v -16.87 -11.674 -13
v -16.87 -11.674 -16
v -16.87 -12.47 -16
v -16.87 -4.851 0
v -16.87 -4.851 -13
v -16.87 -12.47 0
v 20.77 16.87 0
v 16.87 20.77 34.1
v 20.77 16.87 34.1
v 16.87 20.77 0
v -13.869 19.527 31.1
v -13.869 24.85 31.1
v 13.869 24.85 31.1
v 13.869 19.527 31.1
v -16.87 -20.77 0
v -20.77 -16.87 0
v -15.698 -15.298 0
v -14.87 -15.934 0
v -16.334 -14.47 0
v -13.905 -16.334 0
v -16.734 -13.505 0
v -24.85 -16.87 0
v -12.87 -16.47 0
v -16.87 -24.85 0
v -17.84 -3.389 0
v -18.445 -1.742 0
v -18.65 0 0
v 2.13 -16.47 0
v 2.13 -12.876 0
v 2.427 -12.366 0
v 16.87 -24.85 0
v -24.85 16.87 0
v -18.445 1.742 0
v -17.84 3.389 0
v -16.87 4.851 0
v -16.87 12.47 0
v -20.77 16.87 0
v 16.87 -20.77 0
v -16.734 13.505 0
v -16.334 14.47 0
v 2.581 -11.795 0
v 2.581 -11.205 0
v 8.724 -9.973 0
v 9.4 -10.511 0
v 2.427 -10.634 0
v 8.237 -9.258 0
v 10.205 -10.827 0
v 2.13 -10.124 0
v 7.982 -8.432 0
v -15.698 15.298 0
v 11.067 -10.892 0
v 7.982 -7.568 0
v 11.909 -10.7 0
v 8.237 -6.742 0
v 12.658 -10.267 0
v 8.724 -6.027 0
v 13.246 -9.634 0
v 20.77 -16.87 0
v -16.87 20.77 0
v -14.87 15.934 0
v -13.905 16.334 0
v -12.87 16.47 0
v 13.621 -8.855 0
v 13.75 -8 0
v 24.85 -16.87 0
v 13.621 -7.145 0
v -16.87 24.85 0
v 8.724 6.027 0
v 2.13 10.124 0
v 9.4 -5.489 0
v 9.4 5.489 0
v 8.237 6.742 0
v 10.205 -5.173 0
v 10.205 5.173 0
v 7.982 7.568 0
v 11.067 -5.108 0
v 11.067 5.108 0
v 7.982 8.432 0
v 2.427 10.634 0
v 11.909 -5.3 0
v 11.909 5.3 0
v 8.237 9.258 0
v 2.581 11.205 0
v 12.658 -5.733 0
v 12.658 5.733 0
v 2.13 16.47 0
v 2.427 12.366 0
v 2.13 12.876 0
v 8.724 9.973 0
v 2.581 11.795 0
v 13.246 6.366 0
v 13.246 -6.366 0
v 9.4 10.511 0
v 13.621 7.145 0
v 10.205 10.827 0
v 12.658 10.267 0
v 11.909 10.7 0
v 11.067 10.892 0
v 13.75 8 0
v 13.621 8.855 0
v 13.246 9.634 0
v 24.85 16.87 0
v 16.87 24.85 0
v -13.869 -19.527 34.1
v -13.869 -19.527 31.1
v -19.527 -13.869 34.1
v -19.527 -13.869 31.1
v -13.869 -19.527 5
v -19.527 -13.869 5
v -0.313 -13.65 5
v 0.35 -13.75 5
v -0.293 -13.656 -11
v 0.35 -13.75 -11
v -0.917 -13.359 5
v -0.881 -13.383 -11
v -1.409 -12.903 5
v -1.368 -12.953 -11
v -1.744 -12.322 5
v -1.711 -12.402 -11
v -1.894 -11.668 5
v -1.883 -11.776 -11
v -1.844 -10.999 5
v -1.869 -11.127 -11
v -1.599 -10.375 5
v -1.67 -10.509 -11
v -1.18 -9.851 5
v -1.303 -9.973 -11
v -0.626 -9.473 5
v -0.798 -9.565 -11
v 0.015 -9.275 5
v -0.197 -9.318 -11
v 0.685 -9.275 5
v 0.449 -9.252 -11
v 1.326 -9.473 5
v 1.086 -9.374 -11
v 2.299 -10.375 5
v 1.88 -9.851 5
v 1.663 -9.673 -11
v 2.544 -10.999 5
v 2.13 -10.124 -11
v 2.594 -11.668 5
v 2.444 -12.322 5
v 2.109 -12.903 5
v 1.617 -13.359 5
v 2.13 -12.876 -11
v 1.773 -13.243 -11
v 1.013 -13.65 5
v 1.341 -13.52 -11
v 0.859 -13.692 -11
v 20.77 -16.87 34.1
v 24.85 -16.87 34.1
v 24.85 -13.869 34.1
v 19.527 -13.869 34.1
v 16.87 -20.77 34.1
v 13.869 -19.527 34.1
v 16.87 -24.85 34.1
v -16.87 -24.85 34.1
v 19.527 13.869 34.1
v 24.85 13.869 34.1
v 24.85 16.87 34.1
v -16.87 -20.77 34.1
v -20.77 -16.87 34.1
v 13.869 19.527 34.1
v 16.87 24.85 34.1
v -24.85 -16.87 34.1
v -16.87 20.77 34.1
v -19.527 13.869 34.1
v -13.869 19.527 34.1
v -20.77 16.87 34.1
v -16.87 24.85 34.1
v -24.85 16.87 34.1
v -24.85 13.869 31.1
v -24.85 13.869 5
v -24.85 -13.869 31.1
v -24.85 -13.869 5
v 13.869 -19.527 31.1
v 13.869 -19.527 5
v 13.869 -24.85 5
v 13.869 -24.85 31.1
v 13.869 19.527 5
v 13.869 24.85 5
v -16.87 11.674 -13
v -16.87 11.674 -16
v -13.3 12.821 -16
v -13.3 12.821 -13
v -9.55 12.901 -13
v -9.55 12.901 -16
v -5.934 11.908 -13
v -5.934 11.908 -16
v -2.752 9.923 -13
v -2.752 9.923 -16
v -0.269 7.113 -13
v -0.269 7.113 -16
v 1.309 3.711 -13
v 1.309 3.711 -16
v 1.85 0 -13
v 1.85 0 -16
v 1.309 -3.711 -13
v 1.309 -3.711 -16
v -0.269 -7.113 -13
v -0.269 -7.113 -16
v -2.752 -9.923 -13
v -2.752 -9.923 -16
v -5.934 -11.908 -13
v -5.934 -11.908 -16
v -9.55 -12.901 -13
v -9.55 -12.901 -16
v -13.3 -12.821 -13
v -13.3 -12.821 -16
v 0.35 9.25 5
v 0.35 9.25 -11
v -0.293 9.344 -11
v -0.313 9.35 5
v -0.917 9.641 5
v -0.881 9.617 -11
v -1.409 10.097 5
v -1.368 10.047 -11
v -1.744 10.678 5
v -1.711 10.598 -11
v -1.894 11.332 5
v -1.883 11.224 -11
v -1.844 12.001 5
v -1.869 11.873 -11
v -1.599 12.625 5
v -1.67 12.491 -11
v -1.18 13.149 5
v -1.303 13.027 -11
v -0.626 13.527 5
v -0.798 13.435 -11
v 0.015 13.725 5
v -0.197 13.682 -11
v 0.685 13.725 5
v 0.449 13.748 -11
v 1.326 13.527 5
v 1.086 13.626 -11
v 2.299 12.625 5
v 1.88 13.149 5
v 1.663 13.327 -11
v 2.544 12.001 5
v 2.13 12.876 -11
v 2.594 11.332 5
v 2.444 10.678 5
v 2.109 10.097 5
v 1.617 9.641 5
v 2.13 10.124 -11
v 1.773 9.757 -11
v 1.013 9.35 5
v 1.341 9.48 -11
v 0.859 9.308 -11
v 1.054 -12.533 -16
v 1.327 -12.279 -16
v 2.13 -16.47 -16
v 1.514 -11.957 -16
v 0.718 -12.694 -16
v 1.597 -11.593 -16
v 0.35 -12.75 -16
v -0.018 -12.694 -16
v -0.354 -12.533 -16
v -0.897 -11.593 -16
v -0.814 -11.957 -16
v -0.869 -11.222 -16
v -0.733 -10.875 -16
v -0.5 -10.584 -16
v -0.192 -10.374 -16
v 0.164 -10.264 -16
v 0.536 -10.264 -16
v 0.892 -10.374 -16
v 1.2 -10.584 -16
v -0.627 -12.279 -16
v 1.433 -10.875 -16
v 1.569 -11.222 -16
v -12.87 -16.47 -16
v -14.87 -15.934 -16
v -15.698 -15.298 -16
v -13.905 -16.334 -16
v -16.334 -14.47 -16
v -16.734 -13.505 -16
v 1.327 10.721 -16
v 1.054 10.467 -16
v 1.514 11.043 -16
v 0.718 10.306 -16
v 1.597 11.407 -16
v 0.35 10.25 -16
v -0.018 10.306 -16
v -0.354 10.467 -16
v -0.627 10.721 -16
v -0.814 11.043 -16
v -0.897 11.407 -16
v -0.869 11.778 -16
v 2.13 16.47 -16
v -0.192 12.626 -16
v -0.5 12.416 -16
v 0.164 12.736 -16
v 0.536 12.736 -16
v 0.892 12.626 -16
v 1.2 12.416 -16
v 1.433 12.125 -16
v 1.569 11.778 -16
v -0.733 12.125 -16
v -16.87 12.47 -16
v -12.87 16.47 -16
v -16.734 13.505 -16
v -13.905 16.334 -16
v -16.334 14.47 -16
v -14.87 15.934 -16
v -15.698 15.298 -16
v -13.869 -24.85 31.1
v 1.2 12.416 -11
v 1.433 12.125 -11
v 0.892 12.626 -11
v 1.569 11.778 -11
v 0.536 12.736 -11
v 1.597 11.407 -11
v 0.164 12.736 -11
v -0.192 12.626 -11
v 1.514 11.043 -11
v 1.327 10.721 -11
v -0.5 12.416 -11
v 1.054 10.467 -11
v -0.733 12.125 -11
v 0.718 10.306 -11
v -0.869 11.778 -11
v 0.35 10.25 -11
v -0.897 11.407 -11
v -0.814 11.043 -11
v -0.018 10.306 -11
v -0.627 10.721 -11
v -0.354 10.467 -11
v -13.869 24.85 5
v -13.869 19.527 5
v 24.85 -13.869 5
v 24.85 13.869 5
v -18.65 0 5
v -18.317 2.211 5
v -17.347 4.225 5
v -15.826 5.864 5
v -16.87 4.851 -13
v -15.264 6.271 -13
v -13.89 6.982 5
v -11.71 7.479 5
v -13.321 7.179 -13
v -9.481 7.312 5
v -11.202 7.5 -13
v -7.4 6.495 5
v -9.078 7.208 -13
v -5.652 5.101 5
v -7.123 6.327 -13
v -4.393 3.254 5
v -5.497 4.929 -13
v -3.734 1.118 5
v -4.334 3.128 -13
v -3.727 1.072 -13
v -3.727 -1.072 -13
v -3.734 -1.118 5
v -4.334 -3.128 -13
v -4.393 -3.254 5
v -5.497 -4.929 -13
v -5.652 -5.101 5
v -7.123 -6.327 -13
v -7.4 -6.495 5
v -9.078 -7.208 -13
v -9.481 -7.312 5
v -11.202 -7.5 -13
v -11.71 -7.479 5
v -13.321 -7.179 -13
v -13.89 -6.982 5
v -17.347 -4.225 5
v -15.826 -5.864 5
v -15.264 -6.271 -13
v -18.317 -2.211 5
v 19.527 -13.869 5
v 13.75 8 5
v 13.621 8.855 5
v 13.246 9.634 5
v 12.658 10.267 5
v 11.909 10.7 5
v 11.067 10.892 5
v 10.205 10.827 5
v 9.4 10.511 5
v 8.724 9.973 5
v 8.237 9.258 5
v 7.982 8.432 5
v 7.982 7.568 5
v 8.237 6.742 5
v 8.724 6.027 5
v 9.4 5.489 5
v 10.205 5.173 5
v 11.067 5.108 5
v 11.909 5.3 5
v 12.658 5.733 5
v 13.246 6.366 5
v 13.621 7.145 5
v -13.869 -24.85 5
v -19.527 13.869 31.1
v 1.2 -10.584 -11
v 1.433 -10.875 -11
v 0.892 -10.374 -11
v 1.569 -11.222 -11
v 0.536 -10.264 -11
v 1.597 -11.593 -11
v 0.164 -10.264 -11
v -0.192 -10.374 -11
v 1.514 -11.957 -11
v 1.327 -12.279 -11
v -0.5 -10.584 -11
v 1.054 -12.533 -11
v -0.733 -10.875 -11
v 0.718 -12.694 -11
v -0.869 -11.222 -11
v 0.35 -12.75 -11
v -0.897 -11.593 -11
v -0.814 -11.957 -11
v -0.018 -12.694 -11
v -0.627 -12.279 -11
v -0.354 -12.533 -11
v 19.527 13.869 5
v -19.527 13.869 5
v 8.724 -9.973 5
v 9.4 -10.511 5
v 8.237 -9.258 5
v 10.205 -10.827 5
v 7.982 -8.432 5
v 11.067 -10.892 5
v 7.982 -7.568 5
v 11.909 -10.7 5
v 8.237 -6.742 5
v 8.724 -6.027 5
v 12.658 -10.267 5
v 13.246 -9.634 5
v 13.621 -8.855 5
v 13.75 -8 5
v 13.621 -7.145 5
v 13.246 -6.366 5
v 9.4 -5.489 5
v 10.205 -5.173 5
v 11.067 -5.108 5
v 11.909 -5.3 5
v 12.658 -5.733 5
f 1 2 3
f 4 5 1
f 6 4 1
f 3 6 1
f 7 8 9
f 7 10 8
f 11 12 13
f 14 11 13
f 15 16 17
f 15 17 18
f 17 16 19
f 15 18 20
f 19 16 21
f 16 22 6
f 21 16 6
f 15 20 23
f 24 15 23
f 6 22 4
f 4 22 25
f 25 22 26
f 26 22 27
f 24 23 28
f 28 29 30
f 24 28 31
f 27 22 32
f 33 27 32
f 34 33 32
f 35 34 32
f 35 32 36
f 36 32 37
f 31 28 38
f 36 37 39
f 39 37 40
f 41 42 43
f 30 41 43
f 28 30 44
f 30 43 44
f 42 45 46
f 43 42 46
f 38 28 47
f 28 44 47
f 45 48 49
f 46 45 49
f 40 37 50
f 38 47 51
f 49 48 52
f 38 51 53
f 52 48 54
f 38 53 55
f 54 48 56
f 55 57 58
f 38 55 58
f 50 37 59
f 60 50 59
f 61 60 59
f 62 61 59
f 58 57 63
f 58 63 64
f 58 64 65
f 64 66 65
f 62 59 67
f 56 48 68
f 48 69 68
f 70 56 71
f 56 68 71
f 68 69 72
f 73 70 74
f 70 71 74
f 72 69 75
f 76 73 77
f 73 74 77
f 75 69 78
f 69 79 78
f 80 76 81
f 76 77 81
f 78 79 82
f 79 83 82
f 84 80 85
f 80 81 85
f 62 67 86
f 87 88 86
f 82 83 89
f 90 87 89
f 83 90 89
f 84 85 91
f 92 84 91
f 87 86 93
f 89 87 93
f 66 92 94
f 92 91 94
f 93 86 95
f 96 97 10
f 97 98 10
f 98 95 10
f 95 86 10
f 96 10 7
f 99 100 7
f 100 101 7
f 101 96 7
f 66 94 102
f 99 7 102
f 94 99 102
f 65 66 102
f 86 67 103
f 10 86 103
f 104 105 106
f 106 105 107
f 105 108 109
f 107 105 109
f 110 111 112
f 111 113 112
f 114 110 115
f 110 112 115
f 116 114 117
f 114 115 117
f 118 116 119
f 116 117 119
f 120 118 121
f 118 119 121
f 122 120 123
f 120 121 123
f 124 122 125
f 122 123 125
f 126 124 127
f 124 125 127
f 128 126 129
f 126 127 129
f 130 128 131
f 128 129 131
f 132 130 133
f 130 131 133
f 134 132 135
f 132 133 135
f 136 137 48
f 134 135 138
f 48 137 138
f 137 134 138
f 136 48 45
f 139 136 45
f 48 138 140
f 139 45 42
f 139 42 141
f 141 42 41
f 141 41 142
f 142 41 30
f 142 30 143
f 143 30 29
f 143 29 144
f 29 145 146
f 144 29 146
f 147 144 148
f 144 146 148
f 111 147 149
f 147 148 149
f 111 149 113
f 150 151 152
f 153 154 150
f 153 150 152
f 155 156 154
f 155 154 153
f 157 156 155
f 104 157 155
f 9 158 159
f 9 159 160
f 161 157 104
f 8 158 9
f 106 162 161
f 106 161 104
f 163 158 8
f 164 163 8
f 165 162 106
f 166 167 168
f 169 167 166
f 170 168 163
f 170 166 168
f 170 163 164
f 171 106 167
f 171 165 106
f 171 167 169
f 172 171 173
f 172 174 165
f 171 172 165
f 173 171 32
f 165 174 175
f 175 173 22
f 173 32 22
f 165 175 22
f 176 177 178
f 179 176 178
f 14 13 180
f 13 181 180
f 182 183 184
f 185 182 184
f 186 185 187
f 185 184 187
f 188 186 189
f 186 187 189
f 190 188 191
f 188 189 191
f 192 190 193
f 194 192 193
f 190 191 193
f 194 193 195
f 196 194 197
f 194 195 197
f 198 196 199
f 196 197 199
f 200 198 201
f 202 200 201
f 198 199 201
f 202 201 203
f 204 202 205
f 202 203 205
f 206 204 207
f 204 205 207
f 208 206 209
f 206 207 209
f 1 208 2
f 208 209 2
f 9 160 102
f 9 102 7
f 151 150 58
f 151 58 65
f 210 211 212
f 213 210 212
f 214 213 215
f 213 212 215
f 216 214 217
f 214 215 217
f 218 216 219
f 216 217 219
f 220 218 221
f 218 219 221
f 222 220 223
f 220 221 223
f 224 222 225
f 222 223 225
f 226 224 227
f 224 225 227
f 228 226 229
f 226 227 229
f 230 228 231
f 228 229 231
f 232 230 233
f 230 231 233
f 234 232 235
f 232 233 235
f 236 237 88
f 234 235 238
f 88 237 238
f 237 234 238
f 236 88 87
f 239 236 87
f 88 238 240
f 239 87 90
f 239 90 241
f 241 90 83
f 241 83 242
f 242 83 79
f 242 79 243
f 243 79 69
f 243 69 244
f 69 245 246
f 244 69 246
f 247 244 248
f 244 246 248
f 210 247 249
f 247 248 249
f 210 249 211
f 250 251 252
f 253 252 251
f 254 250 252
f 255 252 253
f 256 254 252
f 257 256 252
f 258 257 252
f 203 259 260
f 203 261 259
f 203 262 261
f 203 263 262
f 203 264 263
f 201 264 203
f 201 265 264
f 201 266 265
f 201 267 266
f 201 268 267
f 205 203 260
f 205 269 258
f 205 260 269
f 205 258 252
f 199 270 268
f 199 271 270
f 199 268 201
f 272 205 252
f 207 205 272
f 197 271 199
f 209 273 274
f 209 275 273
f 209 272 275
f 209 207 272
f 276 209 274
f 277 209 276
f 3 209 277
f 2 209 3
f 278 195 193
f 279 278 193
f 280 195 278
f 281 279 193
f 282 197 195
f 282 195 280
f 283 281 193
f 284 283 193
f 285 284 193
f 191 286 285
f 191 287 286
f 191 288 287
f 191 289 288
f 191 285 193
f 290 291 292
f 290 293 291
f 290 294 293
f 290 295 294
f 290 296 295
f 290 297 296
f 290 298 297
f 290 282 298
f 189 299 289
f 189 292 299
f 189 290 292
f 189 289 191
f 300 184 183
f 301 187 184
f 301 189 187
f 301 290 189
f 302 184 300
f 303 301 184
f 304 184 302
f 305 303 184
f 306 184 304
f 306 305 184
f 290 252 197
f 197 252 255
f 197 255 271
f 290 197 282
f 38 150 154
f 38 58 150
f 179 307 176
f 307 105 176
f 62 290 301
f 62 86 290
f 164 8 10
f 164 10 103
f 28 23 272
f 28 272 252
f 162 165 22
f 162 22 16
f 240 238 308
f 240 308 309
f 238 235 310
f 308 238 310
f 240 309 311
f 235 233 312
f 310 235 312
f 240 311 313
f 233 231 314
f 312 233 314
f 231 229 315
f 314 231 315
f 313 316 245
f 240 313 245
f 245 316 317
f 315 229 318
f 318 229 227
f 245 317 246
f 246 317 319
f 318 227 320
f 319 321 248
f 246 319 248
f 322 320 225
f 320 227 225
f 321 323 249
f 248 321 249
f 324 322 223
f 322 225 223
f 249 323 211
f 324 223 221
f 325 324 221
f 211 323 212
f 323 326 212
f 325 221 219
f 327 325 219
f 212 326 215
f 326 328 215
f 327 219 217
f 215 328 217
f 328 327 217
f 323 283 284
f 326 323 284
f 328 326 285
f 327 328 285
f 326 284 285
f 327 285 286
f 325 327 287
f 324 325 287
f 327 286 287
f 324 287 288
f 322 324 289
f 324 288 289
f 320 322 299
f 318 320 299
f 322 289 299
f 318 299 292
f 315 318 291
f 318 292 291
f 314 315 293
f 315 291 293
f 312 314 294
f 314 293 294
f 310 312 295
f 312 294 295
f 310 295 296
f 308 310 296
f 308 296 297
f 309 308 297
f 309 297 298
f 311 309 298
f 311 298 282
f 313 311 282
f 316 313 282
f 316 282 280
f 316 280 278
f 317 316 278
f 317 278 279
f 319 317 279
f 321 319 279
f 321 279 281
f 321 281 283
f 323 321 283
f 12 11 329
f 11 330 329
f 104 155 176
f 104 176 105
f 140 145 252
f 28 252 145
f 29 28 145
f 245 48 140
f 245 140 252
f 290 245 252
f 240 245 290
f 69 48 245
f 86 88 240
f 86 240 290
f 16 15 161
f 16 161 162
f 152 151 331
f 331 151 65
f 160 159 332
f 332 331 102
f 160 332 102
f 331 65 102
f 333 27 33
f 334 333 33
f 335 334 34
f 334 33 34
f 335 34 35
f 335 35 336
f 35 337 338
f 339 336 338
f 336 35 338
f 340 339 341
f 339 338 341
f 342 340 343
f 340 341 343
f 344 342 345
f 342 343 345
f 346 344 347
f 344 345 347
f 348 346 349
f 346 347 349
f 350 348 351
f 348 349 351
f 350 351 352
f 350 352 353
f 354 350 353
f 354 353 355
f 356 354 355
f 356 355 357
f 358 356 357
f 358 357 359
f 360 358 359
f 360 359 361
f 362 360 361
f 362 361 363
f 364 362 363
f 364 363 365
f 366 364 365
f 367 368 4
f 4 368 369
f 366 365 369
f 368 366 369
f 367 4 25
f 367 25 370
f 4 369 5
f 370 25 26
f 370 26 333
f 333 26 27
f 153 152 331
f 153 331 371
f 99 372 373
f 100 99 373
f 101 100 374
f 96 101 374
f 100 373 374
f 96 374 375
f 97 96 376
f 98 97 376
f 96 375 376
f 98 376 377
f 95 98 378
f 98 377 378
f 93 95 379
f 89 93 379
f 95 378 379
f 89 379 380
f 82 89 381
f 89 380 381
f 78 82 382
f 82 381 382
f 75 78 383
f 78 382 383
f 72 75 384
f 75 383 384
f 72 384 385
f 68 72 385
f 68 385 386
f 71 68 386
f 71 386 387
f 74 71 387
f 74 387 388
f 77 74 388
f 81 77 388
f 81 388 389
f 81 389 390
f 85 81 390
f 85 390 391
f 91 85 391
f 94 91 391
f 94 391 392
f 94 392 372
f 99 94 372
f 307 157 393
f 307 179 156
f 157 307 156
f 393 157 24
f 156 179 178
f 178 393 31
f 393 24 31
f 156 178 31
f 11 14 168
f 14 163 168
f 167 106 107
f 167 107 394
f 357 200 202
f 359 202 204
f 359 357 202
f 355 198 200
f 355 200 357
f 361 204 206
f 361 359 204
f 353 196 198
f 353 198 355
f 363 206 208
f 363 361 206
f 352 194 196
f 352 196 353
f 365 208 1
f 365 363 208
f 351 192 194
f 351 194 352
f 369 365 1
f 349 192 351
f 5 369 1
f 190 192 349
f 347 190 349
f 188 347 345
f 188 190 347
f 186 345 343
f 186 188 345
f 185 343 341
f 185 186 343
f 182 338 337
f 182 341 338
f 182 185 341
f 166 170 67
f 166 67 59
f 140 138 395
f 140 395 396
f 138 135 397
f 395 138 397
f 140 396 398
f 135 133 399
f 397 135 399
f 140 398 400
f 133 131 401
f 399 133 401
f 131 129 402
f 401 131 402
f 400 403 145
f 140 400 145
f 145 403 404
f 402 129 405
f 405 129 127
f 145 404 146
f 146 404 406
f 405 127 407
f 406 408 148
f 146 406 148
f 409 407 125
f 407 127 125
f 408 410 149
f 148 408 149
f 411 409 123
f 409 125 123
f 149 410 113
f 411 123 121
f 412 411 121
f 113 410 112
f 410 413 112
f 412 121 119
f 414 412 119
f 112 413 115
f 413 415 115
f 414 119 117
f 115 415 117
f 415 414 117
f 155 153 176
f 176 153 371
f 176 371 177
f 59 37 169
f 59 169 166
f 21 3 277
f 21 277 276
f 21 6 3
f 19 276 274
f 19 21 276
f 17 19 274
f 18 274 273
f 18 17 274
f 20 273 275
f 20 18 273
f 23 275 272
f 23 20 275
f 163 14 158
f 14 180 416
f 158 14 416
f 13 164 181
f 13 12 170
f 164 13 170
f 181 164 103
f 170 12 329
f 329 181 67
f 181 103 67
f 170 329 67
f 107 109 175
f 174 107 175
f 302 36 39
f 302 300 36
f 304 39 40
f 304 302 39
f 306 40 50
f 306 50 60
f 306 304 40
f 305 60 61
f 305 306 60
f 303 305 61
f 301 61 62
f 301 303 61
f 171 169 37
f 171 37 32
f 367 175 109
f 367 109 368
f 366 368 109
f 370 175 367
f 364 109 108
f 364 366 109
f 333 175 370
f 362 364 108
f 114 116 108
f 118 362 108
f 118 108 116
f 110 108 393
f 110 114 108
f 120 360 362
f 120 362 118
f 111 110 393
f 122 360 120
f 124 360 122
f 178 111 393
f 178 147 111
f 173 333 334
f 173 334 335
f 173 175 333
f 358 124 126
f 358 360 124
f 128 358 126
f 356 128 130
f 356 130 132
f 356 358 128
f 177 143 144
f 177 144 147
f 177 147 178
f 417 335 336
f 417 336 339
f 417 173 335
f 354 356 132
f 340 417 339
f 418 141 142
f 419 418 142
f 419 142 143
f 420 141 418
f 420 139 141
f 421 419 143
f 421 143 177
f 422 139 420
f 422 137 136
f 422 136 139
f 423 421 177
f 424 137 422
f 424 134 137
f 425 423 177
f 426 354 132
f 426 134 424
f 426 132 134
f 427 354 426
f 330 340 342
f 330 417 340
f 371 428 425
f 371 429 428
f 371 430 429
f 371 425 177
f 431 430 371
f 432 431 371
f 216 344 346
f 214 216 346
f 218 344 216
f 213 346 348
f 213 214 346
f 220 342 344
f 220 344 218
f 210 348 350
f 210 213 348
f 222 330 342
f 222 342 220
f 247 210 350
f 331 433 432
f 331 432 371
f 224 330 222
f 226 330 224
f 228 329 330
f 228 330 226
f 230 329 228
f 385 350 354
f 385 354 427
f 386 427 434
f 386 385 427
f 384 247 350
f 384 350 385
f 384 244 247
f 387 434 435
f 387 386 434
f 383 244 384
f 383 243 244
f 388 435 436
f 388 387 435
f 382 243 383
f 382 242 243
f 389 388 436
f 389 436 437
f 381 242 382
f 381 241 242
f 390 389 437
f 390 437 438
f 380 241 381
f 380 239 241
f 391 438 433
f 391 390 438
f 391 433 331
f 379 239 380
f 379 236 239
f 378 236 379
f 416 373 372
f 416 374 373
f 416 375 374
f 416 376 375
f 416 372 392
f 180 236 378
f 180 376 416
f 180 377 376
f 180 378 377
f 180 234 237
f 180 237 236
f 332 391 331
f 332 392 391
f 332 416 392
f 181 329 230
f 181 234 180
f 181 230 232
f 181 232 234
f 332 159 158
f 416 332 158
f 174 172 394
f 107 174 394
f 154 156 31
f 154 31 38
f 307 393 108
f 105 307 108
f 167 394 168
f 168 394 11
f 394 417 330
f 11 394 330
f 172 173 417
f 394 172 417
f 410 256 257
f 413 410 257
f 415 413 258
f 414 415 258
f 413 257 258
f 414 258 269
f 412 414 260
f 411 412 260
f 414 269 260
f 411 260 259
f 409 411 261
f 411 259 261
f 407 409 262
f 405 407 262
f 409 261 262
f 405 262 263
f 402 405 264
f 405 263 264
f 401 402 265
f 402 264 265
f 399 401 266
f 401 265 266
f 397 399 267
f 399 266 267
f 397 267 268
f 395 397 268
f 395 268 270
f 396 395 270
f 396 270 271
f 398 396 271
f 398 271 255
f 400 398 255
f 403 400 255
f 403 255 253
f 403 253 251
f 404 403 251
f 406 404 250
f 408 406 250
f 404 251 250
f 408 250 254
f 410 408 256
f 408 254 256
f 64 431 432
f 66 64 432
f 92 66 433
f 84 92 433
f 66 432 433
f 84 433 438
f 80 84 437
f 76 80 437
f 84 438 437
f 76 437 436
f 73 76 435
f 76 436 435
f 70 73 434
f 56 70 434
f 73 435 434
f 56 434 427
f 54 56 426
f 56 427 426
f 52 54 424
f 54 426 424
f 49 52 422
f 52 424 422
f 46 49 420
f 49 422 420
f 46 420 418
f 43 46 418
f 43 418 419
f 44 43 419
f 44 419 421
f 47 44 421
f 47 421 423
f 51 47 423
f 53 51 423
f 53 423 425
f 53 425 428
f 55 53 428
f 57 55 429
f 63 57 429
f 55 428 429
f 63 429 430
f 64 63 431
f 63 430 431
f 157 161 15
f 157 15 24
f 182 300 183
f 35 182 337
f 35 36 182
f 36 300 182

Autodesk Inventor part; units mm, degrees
ref_plane "Work Plane1" through (0, 0, 0) normal (0, 0, 1) x (1, 0, 0)
sketch "Sketch1" plane through (0, 0, 0) normal (0, 0, 1) x (1, 0, 0)
  arc A0 (12.5934, -5.8404) -> (12.8401, -5.9947) centre (12.8241, -5.7459) ccw construction
  line L0 (12.8401, -5.9947) -> (16.4715, -5.9947) construction
  line L1 (16.4715, -5.9947) -> (16.97, -5.4961) construction
  line L2 (16.97, -5.4961) -> (16.97, 1.583) construction
  arc A1 (16.97, 2.3806) -> (16.97, 1.583) centre (17.2691, 1.9818) ccw construction
  line L3 (16.97, 2.3806) -> (16.97, 5.4715) construction
  line L4 (16.97, 5.4715) -> (16.4715, 5.97) construction
  line L5 (16.4715, 5.97) -> (12.8401, 5.97) construction
  arc A2 (12.8401, 5.97) -> (12.6094, 5.8152) centre (12.8401, 5.7207) ccw construction
  arc A3 (12.0954, 5.2394) -> (12.6094, 5.8152) centre (11.5075, 6.2814) ccw construction
  arc A4 (12.0954, 5.2394) -> (11.974, 5.0466) centre (12.2223, 5.0248) ccw construction
  line L6 (11.974, 5.0466) -> (11.9439, 4.702) construction
  arc A5 (11.6955, 4.4744) -> (11.9439, 4.702) centre (11.6955, 4.7237) ccw construction
  line L7 (11.6955, 4.4744) -> (11.2445, 4.4744) construction
  arc A6 (10.9961, 4.702) -> (11.2445, 4.4744) centre (11.2445, 4.7237) ccw construction
  line L8 (10.9961, 4.702) -> (10.9642, 5.0674) construction
  arc A7 (10.9642, 5.0674) -> (10.8487, 5.2566) centre (10.7158, 5.0457) ccw construction
  arc A8 (10.3792, 5.8152) -> (10.8487, 5.2566) centre (11.4862, 6.2691) ccw construction
  arc A9 (10.3792, 5.8152) -> (10.1485, 5.97) centre (10.1485, 5.7206) ccw construction
  line L9 (10.1485, 5.97) -> (9.4685, 5.97) construction
  line L10 (9.4685, 5.97) -> (8.97, 5.4715) construction
  line L11 (8.97, 5.4715) -> (8.97, -5.4961) construction
  line L12 (8.97, -5.4961) -> (9.4685, -5.9947) construction
  line L13 (9.4685, -5.9947) -> (10.1412, -5.9947) construction
  arc A10 (10.1412, -5.9947) -> (10.3791, -5.84) centre (10.1485, -5.7455) ccw construction
  arc A11 (10.8487, -5.2813) -> (10.3791, -5.84) centre (11.4862, -6.2938) ccw construction
  arc A12 (10.8487, -5.2813) -> (10.9642, -5.0921) centre (10.7158, -5.0704) ccw construction
  line L14 (10.9642, -5.0921) -> (10.9961, -4.7266) construction
  arc A13 (11.2445, -4.4991) -> (10.9961, -4.7266) centre (11.2445, -4.7483) ccw construction
  line L15 (11.2445, -4.4991) -> (11.6955, -4.4991) construction
  arc A14 (11.9439, -4.7266) -> (11.6955, -4.4991) centre (11.6955, -4.7483) ccw construction
  line L16 (11.9439, -4.7266) -> (11.974, -5.0712) construction
  arc A15 (11.974, -5.0712) -> (12.0954, -5.264) centre (12.2223, -5.0495) ccw construction
  arc A16 (12.5934, -5.8404) -> (12.0954, -5.264) centre (11.4862, -6.2938) ccw construction
  arc A17 (24.85, 22.85) -> (22.85, 24.85) centre (22.85, 22.85) ccw construction
  line L17 (22.85, 24.85) -> (-16.97, 24.85) construction
  line L18 (-16.97, 24.85) -> (-16.97, 21.15) construction
  line L19 (-16.97, 21.15) -> (16.97, 21.15) construction
  line L20 (16.97, 16.97) -> (16.97, 21.15) construction
  line L21 (21.15, 16.97) -> (16.97, 16.97) construction
  line L22 (21.15, 16.97) -> (21.15, -16.97) construction
  line L23 (21.15, -16.97) -> (24.85, -16.97) construction
  line L24 (24.85, -16.97) -> (24.85, 22.85) construction
  line L25 (23.75, 23.25) -> (23.75, 18.15) construction
  arc A18 (23.25, 17.65) -> (23.75, 18.15) centre (23.25, 18.15) ccw construction
  line L26 (23.25, 17.65) -> (20.8937, 17.65) construction
  arc A19 (20.5239, 17.8134) -> (20.8937, 17.65) centre (20.8937, 18.15) ccw construction
  line L27 (20.5239, 17.8134) -> (17.7803, 20.8273) construction
  arc A20 (17.65, 21.1639) -> (17.7803, 20.8273) centre (18.15, 21.1639) ccw construction
  line L28 (17.65, 21.1639) -> (17.65, 23.25) construction
  arc A21 (18.15, 23.75) -> (17.65, 23.25) centre (18.15, 23.25) ccw construction
  line L29 (18.15, 23.75) -> (23.25, 23.75) construction
  arc A22 (23.75, 23.25) -> (23.25, 23.75) centre (23.25, 23.25) ccw construction
  arc A23 (-24.85, -22.85) -> (-22.85, -24.85) centre (-22.85, -22.85) ccw construction
  line L30 (-22.85, -24.85) -> (16.97, -24.85) construction
  line L31 (16.97, -24.85) -> (16.97, -21.15) construction
  line L32 (16.97, -21.15) -> (-16.97, -21.15) construction
  line L33 (-16.97, -16.97) -> (-16.97, -21.15) construction
  line L34 (-21.15, -16.97) -> (-16.97, -16.97) construction
  line L35 (-21.15, -16.97) -> (-21.15, 16.97) construction
  line L36 (-21.15, 16.97) -> (-24.85, 16.97) construction
  line L37 (-24.85, 16.97) -> (-24.85, -22.85) construction
  line L38 (-20.8273, -17.7803) -> (-17.8134, -20.5239) construction
  arc A24 (-17.65, -20.8937) -> (-17.8134, -20.5239) centre (-18.15, -20.8937) ccw construction
  line L39 (-17.65, -20.8937) -> (-17.65, -23.25) construction
  arc A25 (-18.15, -23.75) -> (-17.65, -23.25) centre (-18.15, -23.25) ccw construction
  line L40 (-18.15, -23.75) -> (-23.25, -23.75) construction
  arc A26 (-23.75, -23.25) -> (-23.25, -23.75) centre (-23.25, -23.25) ccw construction
  line L41 (-23.75, -23.25) -> (-23.75, -18.15) construction
  arc A27 (-23.25, -17.65) -> (-23.75, -18.15) centre (-23.25, -18.15) ccw construction
  line L42 (-23.25, -17.65) -> (-21.1639, -17.65) construction
  arc A28 (-20.8273, -17.7803) -> (-21.1639, -17.65) centre (-21.1639, -18.15) ccw construction
  arc A29 (-22.85, 24.85) -> (-24.85, 22.85) centre (-22.85, 22.85) ccw construction
  line L43 (-22.85, 24.85) -> (16.97, 24.85) construction
  line L44 (16.97, 24.85) -> (16.97, 21.15) construction
  line L45 (16.97, 21.15) -> (-16.97, 21.15) construction
  line L46 (-16.97, 16.97) -> (-16.97, 21.15) construction
  line L47 (-21.15, 16.97) -> (-16.97, 16.97) construction
  line L48 (-21.15, 16.97) -> (-21.15, -16.97) construction
  line L49 (-21.15, -16.97) -> (-24.85, -16.97) construction
  line L50 (-24.85, -16.97) -> (-24.85, 22.85) construction
  line L51 (-20.8273, 17.7803) -> (-17.8134, 20.5239) construction
  arc A30 (-17.8134, 20.5239) -> (-17.65, 20.8937) centre (-18.15, 20.8937) ccw construction
  line L52 (-17.65, 20.8937) -> (-17.65, 23.25) construction
  arc A31 (-17.65, 23.25) -> (-18.15, 23.75) centre (-18.15, 23.25) ccw construction
  line L53 (-18.15, 23.75) -> (-23.25, 23.75) construction
  arc A32 (-23.25, 23.75) -> (-23.75, 23.25) centre (-23.25, 23.25) ccw construction
  line L54 (-23.75, 23.25) -> (-23.75, 18.15) construction
  arc A33 (-23.75, 18.15) -> (-23.25, 17.65) centre (-23.25, 18.15) ccw construction
  line L55 (-23.25, 17.65) -> (-21.1639, 17.65) construction
  arc A34 (-21.1639, 17.65) -> (-20.8273, 17.7803) centre (-21.1639, 18.15) ccw construction
  arc A35 (22.85, -24.85) -> (24.85, -22.85) centre (22.85, -22.85) ccw construction
  line L56 (22.85, -24.85) -> (-16.97, -24.85) construction
  line L57 (-16.97, -24.85) -> (-16.97, -21.15) construction
  line L58 (-16.97, -21.15) -> (16.97, -21.15) construction
  line L59 (16.97, -16.97) -> (16.97, -21.15) construction
  line L60 (21.15, -16.97) -> (16.97, -16.97) construction
  line L61 (21.15, -16.97) -> (21.15, 16.97) construction
  line L62 (21.15, 16.97) -> (24.85, 16.97) construction
  line L63 (24.85, 16.97) -> (24.85, -22.85) construction
  line L64 (23.75, -23.25) -> (23.75, -18.15) construction
  arc A36 (23.75, -18.15) -> (23.25, -17.65) centre (23.25, -18.15) ccw construction
  line L65 (23.25, -17.65) -> (20.8937, -17.65) construction
  arc A37 (20.8937, -17.65) -> (20.5239, -17.8134) centre (20.8937, -18.15) ccw construction
  line L66 (20.5239, -17.8134) -> (17.7803, -20.8273) construction
  arc A38 (17.7803, -20.8273) -> (17.65, -21.1639) centre (18.15, -21.1639) ccw construction
  line L67 (17.65, -21.1639) -> (17.65, -23.25) construction
  arc A39 (17.65, -23.25) -> (18.15, -23.75) centre (18.15, -23.25) ccw construction
  line L68 (18.15, -23.75) -> (23.25, -23.75) construction
  arc A40 (23.25, -23.75) -> (23.75, -23.25) centre (23.25, -23.25) ccw construction
  circle A41 centre (0.47, -10.47) radius 1.1 construction
  circle A42 centre (0.47, 12.53) radius 1.025 construction
  line L69 (24.85, 16.87) -> (16.87, 16.87)
  line L70 (16.87, 16.87) -> (16.87, -16.87)
  line L71 (16.87, -16.87) -> (24.85, -16.87)
  line L72 (24.85, -16.87) -> (24.85, 16.87)
  line L73 (-16.87, 24.85) -> (16.87, 24.85)
  line L74 (16.87, 24.85) -> (16.87, 13.87)
  line L75 (16.87, 13.87) -> (-16.87, 13.87)
  line L76 (-16.87, 13.87) -> (-16.87, 24.85)
  line L77 (-16.87, 16.87) -> (-24.85, 16.87)
  line L78 (-24.85, 16.87) -> (-24.85, -16.87)
  line L79 (-24.85, -16.87) -> (-16.87, -16.87)
  line L80 (-16.87, -16.87) -> (-16.87, 16.87)
  line L81 (-16.87, -24.85) -> (16.87, -24.85)
  line L82 (16.87, -24.85) -> (16.87, -13.87)
  line L83 (16.87, -13.87) -> (-16.87, -13.87)
  line L84 (-16.87, -13.87) -> (-16.87, -24.85)
  line L85 (16.87, 13.87) -> (-16.87, 13.87)
  line L86 (-16.87, 13.87) -> (-16.87, -13.87)
  line L87 (-16.87, -13.87) -> (16.87, -13.87)
  line L88 (16.87, -13.87) -> (16.87, 13.87)
  point P0 (0, 0)
extrude "Extrusion1" add sketch "Sketch1" along normal blind 5
chamfer "Chamfer1" distance 3.9 angle 45 4 edges at (16.87, -16.87, 2.5) (-16.87, -16.87, 2.5) (-16.87, 16.87, 2.5) (16.87, 16.87, 2.5)
sketch "Sketch2" plane through (0, 0, 5) normal (0, 0, 1) x (1, 0, 0)
  line L0 (16.87, -24.85) -> (16.87, -20.77) projected
  line L1 (-16.87, -20.77) -> (-16.87, -24.85) projected
  line L2 (-16.87, -24.85) -> (16.87, -24.85) projected
  line L3 (20.77, -16.87) -> (16.87, -20.77) projected
  line L4 (20.77, -16.87) -> (24.85, -16.87) projected
  line L5 (24.85, -16.87) -> (24.85, 16.87) projected
  line L6 (24.85, 16.87) -> (20.77, 16.87) projected
  line L7 (16.87, 20.77) -> (20.77, 16.87) projected
  line L8 (16.87, 20.77) -> (16.87, 24.85) projected
  line L9 (16.87, 24.85) -> (-16.87, 24.85) projected
  line L10 (-16.87, 24.85) -> (-16.87, 20.77) projected
  line L11 (-20.77, 16.87) -> (-16.87, 20.77) projected
  line L12 (-20.77, 16.87) -> (-24.85, 16.87) projected
  line L13 (-24.85, 16.87) -> (-24.85, -16.87) projected
  line L14 (-24.85, -16.87) -> (-20.77, -16.87) projected
  line L15 (-16.87, -20.77) -> (-20.77, -16.87) projected
  line L16 (13.8689, -19.5269) -> (13.8689, -21.8489)
  line L17 (-13.8689, -21.8489) -> (-13.8689, -19.5269)
  line L18 (-13.8689, -19.5269) -> (-19.5269, -13.8689)
  line L19 (-19.5269, -13.8689) -> (-21.8489, -13.8689)
  line L20 (-21.8489, 13.8689) -> (-19.5269, 13.8689)
  line L21 (-19.5269, 13.8689) -> (-13.8689, 19.5269)
  line L22 (-13.8689, 19.5269) -> (-13.8689, 21.8489)
  line L23 (13.8689, 21.8489) -> (13.8689, 19.5269)
  line L24 (13.8689, 19.5269) -> (19.5269, 13.8689)
  line L25 (19.5269, 13.8689) -> (21.8489, 13.8689)
  line L26 (21.8489, -13.8689) -> (19.5269, -13.8689)
  line L27 (19.5269, -13.8689) -> (13.8689, -19.5269)
  line L28 (13.8689, -21.8489) -> (13.8689, -24.85)
  line L29 (16.87, -24.85) -> (-16.87, -24.85) projected
  line L30 (21.8489, -13.8689) -> (24.85, -13.8689)
  line L31 (24.85, -16.87) -> (24.85, 16.87) projected
  line L32 (21.8489, 13.8689) -> (24.85, 13.8689)
  line L33 (13.8689, 21.8489) -> (13.8689, 24.85)
  line L34 (-13.8689, 21.8489) -> (-13.8689, 24.85)
  line L35 (-21.8489, 13.8689) -> (-24.85, 13.8689)
  line L36 (-21.8489, -13.8689) -> (-24.85, -13.8689)
  line L37 (-13.8689, -21.8489) -> (-13.8689, -24.85)
  line L38 (13.8689, -21.8489) -> (11.5469, -21.8489)
  line L39 (-11.5469, -21.8489) -> (-13.8689, -21.8489)
  line L40 (21.8489, 13.8689) -> (21.8489, 11.5469)
  line L41 (21.8489, -11.5469) -> (21.8489, -13.8689)
  line L42 (-21.8489, -13.8689) -> (-21.8489, -11.5469)
  line L43 (-21.8489, 11.5469) -> (-21.8489, 13.8689)
  line L44 (-13.8689, 21.8489) -> (-11.5469, 21.8489)
  line L45 (11.5469, 21.8489) -> (13.8689, 21.8489)
  point P0 (0, 0)
ref_plane "Work Plane2" through (-16.97, -24.85, 34.1) normal (0, 0, -1) x (0, 1, 0)
extrude "Extrusion2" add sketch "Sketch2" along normal up to surface (29.1 mm away) contours L2 L28 L16 L27 L26 L30 L5 L4 L3 L0
pattern_circular "Circular Pattern1" count 4 over 360 about axis through (0, 0, 17.13) along (0, 0, -1) of "Extrusion2"
sketch "Sketch3" plane through (-24.85, -13.8689, 34.1) normal (0, 0, 1) x (1, 0, 0)
  circle A0 centre (13.82, 13.8689) radius 1.5 projected
  line L0 (10.9811, -5.658) -> (5.3231, 0) projected
  line L1 (5.3231, 0) -> (0, 0) projected
  line L2 (0, 0) -> (0, -3.0011) projected
  line L3 (0, -3.0011) -> (4.08, -3.0011) projected
  line L4 (4.08, -3.0011) -> (7.98, -6.9011) projected
  line L5 (7.98, -6.9011) -> (7.98, -10.9811) projected
  line L6 (7.98, -10.9811) -> (10.9811, -10.9811) projected
  line L7 (10.9811, -10.9811) -> (10.9811, -5.658) projected
  line L8 (5.3231, 27.7378) -> (10.9811, 33.3958) projected
  line L9 (10.9811, 33.3958) -> (10.9811, 38.7189) projected
  line L10 (10.9811, 38.7189) -> (7.98, 38.7189) projected
  line L11 (7.98, 38.7189) -> (7.98, 34.6389) projected
  line L12 (7.98, 34.6389) -> (4.08, 30.7389) projected
  line L13 (4.08, 30.7389) -> (0, 30.7389) projected
  line L14 (0, 30.7389) -> (0, 27.7378) projected
  line L15 (0, 27.7378) -> (5.3231, 27.7378) projected
  line L16 (10.9811, -10.9811) -> (16.9811, -10.9811)
  line L17 (16.9811, 38.7189) -> (10.9811, 38.7189)
  line L18 (0, 0) -> (0, 27.7378)
  line L19 (0, 0) -> (5.3231, 0)
  line L20 (5.3231, 0) -> (5.3231, 27.7378)
  line L21 (5.3231, 27.7378) -> (0, 27.7378)
  line L22 (0, 27.7378) -> (0, 0)
  line L23 (5.3231, 0) -> (0, 0) projected
  line L24 (5.3231, 0) -> (10.9811, -5.658)
  line L25 (10.9811, 33.3958) -> (5.3231, 27.7378)
  line L26 (38.7189, 38.7189) -> (38.7189, 33.3958) projected
  line L27 (38.7189, -5.658) -> (38.7189, -10.9811) projected
  line L28 (10.9811, -10.9811) -> (38.7189, -10.9811)
  line L29 (38.7189, -10.9811) -> (38.7189, -5.658)
  line L30 (38.7189, -5.658) -> (10.9811, -5.658)
  line L31 (10.9811, -5.658) -> (10.9811, -10.9811)
  line L32 (10.9811, 38.7189) -> (10.9811, 33.3958) projected
  line L33 (10.9811, 38.7189) -> (38.7189, 38.7189)
  line L34 (38.7189, 38.7189) -> (38.7189, 33.3958)
  line L35 (38.7189, 33.3958) -> (10.9811, 33.3958)
  line L36 (10.9811, 33.3958) -> (10.9811, 38.7189)
  line L37 (16.9811, -10.9811) -> (16.9811, -5.658)
  line L38 (16.9811, 33.3958) -> (16.9811, 38.7189)
  line L39 (10.9811, 38.7189) -> (10.9811, 33.3958)
  line L40 (10.9811, -5.658) -> (10.9811, -10.9811)
  line L41 (10.9811, -5.658) -> (10.9811, 0)
  line L42 (10.9811, 27.7378) -> (10.9811, 33.3958)
  line L43 (49.7, 0) -> (44.3769, 0) projected
  line L44 (44.3769, 27.7378) -> (49.7, 27.7378) projected
  line L45 (44.3769, 27.7378) -> (49.7, 27.7378)
  line L46 (49.7, 27.7378) -> (49.7, 0)
  line L47 (49.7, 0) -> (44.3769, 0)
  line L48 (44.3769, 0) -> (44.3769, 27.7378)
  point P0 (24.85, 13.8689)
  dimension "d19" = 6
extrude "Extrusion3" add sketch "Sketch3" against normal blind 3 contours L7 L6 L5 L4 L3 L2 L1 L0 | L30 L37 L16 L7 | L1 L18 L15 L20 | L30 L27 L28 L37 | L15 L14 L13 L12 L11 L10 L9 L8 | L9 L17 L38 L35 | L38 L33 L26 L35 | L43 L48 L44 L46
ref_plane "Work Plane3" through (16.97, -5.4961, -37.9) normal (1, 0, 0) x (0, 1, 0)
sketch "Sketch7" plane through (0, 0, 0) normal (0, 0, -1) x (-1, 0, 0)
  arc A0 (18.93, 12.43) -> (22.43, 8.93) centre (22.43, 12.43) ccw construction
  line L0 (18.93, 12.43) -> (18.93, 14.53) construction
  line L1 (3.13, 14.53) -> (18.93, 14.53) construction
  line L2 (3.13, 14.53) -> (3.13, 12.43) construction
  arc A1 (-0.37, 8.93) -> (3.13, 12.43) centre (-0.37, 12.43) ccw construction
  line L3 (-0.37, 8.93) -> (-2.47, 8.93) construction
  line L4 (-2.47, -6.87) -> (-2.47, 8.93) construction
  line L5 (-2.47, -6.87) -> (-0.37, -6.87) construction
  arc A2 (3.13, -10.37) -> (-0.37, -6.87) centre (-0.37, -10.37) ccw construction
  line L6 (3.13, -10.37) -> (3.13, -12.47) construction
  line L7 (18.93, -12.47) -> (3.13, -12.47) construction
  line L8 (18.93, -12.47) -> (18.93, -10.37) construction
  arc A3 (22.43, -6.87) -> (18.93, -10.37) centre (22.43, -10.37) ccw construction
  line L9 (22.43, -6.87) -> (24.53, -6.87) construction
  line L10 (24.53, 8.93) -> (24.53, -6.87) construction
  line L11 (24.53, 8.93) -> (22.43, 8.93) construction
  circle A4 centre (11.03, 1.03) radius 2.5 construction
  arc A5 (-1.5344, 11.2045) -> (0.934, 13.4886) centre (-0.47, 12.53) ccw construction
  circle A6 centre (-0.47, -10.47) radius 1.1 construction
  arc A7 (0.5944, 13.8555) -> (-1.874, 11.5714) centre (-0.47, 12.53) ccw construction
  line L12 (-19.5269, -13.8689) -> (-24.85, -13.8689) construction
  line L13 (-19.5269, 13.8689) -> (-13.8689, 19.5269) construction
  line L14 (-13.8689, 19.5269) -> (-13.8689, 24.85) construction
  line L15 (-13.8689, 24.85) -> (13.8689, 24.85) construction
  line L16 (13.8689, 24.85) -> (13.8689, 19.5269) construction
  line L17 (13.8689, 19.5269) -> (19.5269, 13.8689) construction
  line L18 (19.5269, 13.8689) -> (24.85, 13.8689) construction
  line L19 (24.85, 13.8689) -> (24.85, -13.8689) construction
  line L20 (24.85, -13.8689) -> (19.5269, -13.8689) construction
  line L21 (19.5269, -13.8689) -> (13.8689, -19.5269) construction
  line L22 (13.8689, -19.5269) -> (13.8689, -24.85) construction
  line L23 (13.8689, -24.85) -> (-13.8689, -24.85) construction
  line L24 (-13.8689, -24.85) -> (-13.8689, -19.5269) construction
  line L25 (-13.8689, -19.5269) -> (-19.5269, -13.8689) construction
  line L26 (16.87, 13.87) -> (-16.87, 13.87) construction
  line L27 (16.87, 13.87) -> (-19.5258, 13.87) projected
  line L28 (-2.13, 13.87) -> (16.87, 13.87)
  line L29 (16.87, 13.87) -> (16.87, -16.47)
  line L30 (16.87, -16.47) -> (-2.13, -16.47)
  line L31 (-2.13, -16.47) -> (-2.13, 13.87)
  line L32 (16.97, 16.97) -> (-16.97, 16.97)
  line L33 (16.87, 13.87) -> (-2.13, 13.87)
  line L34 (-2.13, 13.87) -> (-2.13, 16.47)
  line L35 (-2.13, 16.47) -> (16.87, 16.47)
  line L36 (16.87, 16.47) -> (16.87, 13.87)
  line L37 (-16.97, -16.97) -> (16.97, -16.97) construction
  line L38 (-24.85, -13.8689) -> (-24.85, 13.8689) projected
  line L39 (-24.85, 13.8689) -> (-19.5269, 13.8689) projected
  point P0 (0, 0)
  dimension "d35" = 19
  dimension "d54" = 0.5
  dimension "d55" = 0.5
ref_plane "Work Plane4" through (-25.03, -12.97, -12) normal (0, 0, 1) x (1, 0, 0)
extrude "Extrusion7" add sketch "Sketch7" along normal blind 16 and the other way blind 5
sketch "Sketch8" plane through (0, 0, 5) normal (0, 0, 1) x (1, 0, 0)
  arc A0 (0.35, -14) -> (2.85, -11.5) centre (0.35, -11.5) ccw projected
  circle A1 centre (0.35, 11.5) radius 1.025 projected
  circle A2 centre (0.35, -11.5) radius 1.025 projected
  point P0 (0, 0)
  point P1 (0.47, 12.53)
  point P2 (0.47, -10.47)
hole "Hole1" at (0.35, 11.5, 5) at (0.35, -11.5, 5) direction (0, 0, -1) diameter 2.5 end through all counterbore diameter 4.5 counterbore depth 16
sketch "Sketch9" plane through (2.13, -16.47, -16) normal (0, 0, -1) x (-1, 0, 0)
  circle A0 centre (13.28, 16.47) radius 13
  point P0 (2.13, 16.47)
  dimension "d93" = 11.15
extrude "Extrusion8" cut sketch "Sketch9" against normal blind 3
sketch "Sketch10" plane through (2.13, -16.47, -13) normal (0, 0, -1) x (-1, 0, 0)
  circle A0 centre (13.28, 16.47) radius 7.5
  arc A1 (19, 28.144) -> (19, 4.796) centre (13.28, 16.47) ccw construction
  point P0 (2.13, 16.47)
  dimension "d49" = 15
extrude "Extrusion9" cut sketch "Sketch10" against normal up to next
fillet "Fillet1" radius 4 2 edges at (-16.87, -16.47, -8) (-16.87, 16.47, -8)
sketch "Sketch14" plane through (0, 0, 5) normal (0, 0, 1) x (1, 0, 0)
  circle A0 centre (-11.15, 0) radius 7.5 projected
  line L0 (13.8689, 19.5269) -> (13.8689, 24.85) projected
  line L1 (13.8689, 24.85) -> (-13.8689, 24.85) projected
  line L2 (-13.8689, 24.85) -> (-13.8689, 19.5269) projected
  line L3 (-13.8689, 19.5269) -> (-19.5269, 13.8689) projected
  line L4 (-19.5269, 13.8689) -> (-24.85, 13.8689) projected
  line L5 (-24.85, 13.8689) -> (-24.85, -13.8689) projected
  line L6 (-24.85, -13.8689) -> (-19.5269, -13.8689) projected
  line L7 (-19.5269, -13.8689) -> (-13.8689, -19.5269) projected
  line L8 (-13.8689, -19.5269) -> (-13.8689, -24.85) projected
  line L9 (-13.8689, -24.85) -> (13.8689, -24.85) projected
  line L10 (13.8689, -24.85) -> (13.8689, -19.5269) projected
  line L11 (13.8689, -19.5269) -> (19.5269, -13.8689) projected
  line L12 (19.5269, -13.8689) -> (24.85, -13.8689) projected
  line L13 (24.85, -13.8689) -> (24.85, 13.8689) projected
  line L14 (24.85, 13.8689) -> (19.5269, 13.8689) projected
  line L15 (19.5269, 13.8689) -> (13.8689, 19.5269) projected
  circle A1 centre (10.85, -8) radius 2.9
  circle A2 centre (10.85, 8) radius 2.9
  point P0 (0, 0)
  dimension "d74" = 5.8
  dimension "d75" = 5.8
  dimension "da" = 8
  dimension "d77" = 8
  dimension "db" = 14
  dimension "d79" = 14
extrude "Extrusion12" cut sketch "Sketch14" against normal blind 10 contours A1 | A2
sketch "Sketch17" plane through (-16.87, 24.85, 34.1) normal (0, 0, 1) x (1, 0, 0)
  line L0 (41.72, -10.9811) -> (41.72, -38.7189) projected
  line L1 (36.3969, -38.7189) -> (41.72, -38.7189) projected
  line L2 (36.3969, -38.7189) -> (36.3969, -10.9811) projected
  line L3 (41.72, -10.9811) -> (36.3969, -10.9811) projected
  point P0 (16.87, -24.85)
extrude "Extrusion15" cut sketch "Sketch17" against normal blind 27
equation "\"d77\" = da"
equation "\"d79\" = db"
equation "\"d2\" = d1"
equation "\"d3\" = d1"
equation "\"d4\" = d1"
equation "\"d5\" = d1"
equation "\"d1\" = 0.1"
properties part number "30_Cube_Z_Focus_Drylin_NEMA_base_v3"
